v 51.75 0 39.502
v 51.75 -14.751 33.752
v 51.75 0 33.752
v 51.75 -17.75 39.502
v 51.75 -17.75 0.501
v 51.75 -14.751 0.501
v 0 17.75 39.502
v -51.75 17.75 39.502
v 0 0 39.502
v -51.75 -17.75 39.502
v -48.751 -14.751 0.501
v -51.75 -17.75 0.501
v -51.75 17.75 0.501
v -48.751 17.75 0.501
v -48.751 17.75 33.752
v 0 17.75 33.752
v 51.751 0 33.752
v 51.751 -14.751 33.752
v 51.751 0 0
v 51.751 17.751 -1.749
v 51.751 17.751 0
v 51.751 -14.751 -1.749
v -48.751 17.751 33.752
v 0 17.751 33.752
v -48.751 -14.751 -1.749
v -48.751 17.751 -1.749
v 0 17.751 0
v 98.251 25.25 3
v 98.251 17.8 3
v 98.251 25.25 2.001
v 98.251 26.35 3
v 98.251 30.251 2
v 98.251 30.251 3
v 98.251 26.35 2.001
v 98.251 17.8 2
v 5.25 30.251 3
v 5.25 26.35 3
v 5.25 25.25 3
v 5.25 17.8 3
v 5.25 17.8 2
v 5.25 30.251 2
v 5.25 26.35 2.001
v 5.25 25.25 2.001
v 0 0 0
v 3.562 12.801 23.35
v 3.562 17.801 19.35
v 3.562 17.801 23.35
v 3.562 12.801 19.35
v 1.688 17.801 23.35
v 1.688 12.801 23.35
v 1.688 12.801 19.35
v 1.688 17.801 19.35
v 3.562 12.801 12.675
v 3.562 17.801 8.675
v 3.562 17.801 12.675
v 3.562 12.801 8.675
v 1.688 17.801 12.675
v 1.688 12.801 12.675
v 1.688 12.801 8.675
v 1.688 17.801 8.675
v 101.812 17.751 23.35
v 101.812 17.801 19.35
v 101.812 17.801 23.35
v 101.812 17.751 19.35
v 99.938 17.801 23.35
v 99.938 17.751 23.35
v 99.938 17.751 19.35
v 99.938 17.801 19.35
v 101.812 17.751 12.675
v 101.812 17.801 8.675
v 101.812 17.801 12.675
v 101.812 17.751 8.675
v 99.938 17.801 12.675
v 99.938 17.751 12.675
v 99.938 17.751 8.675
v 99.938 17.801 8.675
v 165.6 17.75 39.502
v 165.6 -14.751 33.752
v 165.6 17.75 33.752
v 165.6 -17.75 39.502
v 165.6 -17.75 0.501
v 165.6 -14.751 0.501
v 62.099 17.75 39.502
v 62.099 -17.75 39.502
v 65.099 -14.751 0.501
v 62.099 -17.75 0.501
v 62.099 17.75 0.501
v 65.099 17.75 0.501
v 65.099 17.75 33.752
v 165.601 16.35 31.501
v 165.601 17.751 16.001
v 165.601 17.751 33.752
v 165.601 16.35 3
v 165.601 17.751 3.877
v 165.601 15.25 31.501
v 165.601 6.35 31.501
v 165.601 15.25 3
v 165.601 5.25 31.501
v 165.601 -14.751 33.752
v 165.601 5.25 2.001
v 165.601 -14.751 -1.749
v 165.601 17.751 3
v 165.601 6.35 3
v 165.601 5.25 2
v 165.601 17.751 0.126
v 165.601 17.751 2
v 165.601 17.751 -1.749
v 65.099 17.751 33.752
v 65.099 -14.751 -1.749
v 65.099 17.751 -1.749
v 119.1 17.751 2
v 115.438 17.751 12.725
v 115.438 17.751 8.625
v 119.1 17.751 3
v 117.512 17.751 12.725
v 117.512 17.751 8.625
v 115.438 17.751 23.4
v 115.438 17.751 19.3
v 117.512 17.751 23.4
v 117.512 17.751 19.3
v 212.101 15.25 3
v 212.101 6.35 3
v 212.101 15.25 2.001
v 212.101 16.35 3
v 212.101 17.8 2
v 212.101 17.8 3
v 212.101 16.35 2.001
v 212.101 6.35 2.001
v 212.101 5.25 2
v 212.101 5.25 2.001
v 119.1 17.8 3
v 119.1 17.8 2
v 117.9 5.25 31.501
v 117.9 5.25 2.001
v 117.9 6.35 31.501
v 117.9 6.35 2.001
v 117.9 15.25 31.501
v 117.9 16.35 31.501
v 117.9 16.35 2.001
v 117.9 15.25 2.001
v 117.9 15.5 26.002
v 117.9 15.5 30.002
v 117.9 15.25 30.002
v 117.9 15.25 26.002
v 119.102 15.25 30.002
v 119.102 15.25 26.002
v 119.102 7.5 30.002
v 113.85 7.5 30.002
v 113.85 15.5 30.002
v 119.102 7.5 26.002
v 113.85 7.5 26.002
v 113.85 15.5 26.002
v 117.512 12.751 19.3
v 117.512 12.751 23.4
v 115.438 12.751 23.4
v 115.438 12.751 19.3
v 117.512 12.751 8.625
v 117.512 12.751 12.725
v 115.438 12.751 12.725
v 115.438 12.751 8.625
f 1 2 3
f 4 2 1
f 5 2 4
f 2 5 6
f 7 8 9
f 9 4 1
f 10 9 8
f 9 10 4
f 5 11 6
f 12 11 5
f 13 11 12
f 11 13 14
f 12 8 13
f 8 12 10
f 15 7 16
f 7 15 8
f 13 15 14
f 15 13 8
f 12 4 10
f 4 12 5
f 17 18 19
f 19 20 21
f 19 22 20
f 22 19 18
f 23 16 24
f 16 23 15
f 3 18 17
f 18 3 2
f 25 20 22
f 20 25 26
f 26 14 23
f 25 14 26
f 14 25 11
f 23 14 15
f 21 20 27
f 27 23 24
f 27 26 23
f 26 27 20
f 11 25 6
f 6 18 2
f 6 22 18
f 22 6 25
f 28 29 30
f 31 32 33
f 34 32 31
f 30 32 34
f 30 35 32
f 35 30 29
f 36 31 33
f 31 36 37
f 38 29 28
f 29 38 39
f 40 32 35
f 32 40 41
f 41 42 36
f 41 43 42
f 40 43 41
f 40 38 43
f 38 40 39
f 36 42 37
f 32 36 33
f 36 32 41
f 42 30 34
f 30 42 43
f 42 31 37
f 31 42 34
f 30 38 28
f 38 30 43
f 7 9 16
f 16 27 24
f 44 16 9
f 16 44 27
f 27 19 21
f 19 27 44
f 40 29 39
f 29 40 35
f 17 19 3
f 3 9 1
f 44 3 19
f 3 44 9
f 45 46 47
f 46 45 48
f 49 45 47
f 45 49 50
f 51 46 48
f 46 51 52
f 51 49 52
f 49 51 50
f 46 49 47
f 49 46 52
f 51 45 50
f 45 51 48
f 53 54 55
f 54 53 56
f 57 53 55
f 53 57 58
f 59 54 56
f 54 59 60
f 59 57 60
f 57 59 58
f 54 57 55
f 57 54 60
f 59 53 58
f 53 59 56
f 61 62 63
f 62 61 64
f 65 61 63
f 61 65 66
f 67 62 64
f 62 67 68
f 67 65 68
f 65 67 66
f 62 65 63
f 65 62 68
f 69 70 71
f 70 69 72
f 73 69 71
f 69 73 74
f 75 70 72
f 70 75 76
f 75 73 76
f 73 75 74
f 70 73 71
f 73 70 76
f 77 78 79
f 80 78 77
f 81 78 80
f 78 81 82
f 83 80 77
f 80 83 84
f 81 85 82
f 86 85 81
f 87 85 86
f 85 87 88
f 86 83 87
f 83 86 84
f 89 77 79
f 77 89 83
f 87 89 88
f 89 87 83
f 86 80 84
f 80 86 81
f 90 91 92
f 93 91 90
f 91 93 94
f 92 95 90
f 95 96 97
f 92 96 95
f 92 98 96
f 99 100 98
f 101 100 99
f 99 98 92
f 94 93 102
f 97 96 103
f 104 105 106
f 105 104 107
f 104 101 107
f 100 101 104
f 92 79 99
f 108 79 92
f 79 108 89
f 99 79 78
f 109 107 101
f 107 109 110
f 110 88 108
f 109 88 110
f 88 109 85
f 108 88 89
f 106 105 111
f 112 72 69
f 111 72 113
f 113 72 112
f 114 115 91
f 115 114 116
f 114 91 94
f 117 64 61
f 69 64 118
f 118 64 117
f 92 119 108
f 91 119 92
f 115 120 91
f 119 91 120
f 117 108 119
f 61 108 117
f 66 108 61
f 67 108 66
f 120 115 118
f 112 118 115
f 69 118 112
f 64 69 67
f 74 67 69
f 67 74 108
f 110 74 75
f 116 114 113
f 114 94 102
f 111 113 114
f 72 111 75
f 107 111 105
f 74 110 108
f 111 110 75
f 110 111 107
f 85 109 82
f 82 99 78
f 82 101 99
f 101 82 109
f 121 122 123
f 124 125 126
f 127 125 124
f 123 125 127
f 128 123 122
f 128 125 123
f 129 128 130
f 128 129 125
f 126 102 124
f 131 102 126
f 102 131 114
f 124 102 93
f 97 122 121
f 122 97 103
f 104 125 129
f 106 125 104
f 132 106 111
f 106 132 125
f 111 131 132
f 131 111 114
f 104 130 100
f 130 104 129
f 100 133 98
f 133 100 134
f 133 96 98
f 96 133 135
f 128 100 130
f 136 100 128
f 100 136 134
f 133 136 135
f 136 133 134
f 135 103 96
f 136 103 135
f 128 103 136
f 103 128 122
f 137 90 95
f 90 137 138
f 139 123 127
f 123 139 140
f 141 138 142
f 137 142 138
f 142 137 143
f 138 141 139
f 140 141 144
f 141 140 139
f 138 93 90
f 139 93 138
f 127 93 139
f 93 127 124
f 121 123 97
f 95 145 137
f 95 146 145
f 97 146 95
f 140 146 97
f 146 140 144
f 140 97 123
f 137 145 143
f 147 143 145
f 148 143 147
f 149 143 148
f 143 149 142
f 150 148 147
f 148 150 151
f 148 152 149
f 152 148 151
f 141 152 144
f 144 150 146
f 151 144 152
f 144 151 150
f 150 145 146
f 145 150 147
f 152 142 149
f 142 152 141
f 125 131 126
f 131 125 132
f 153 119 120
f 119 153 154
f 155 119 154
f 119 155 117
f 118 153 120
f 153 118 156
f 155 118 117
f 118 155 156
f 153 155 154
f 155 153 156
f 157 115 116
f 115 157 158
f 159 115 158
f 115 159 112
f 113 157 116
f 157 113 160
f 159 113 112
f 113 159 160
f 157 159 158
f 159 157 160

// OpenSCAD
use <BOSL2/std.scad>

use <primitives/prisms.scad>
use <primitives/boxes.scad>
use <snap_joints/cantilever.scad>

eps=0.001;

box_bottom_two_halves(depth=25, div_locs=[0, 10, 20]);

module box_bottom_two_halves (
depth,
div_locs, 
width=93,
outer_height=35, 
inner_height=28, 
inner_wall_thickness=3.75, 
outer_wall_thickness=1.5, 
snap_plug_block_height=3, 
snap_plug_width=7, 
snap_socket_tol=1.0,
chamfer=2.0,
div_thickness=1.0,
div_extra_width=1.0,
div_tol=0.7,
div_z_indent=0.5,
extra_bottom_thickness=1.0, 
center=false,
) 
{ 
    
    full_width = width + outer_wall_thickness*2 + inner_wall_thickness*2;
    full_depth = depth + outer_wall_thickness*2 + inner_wall_thickness*2+ 0.1;
    full_height = outer_height +outer_wall_thickness + extra_bottom_thickness;
    
 
    join_plug_depth = 5;
    join_plug_width = inner_wall_thickness * 0.5;
    join_plug_height = 4;
    join_socket_tol = 0.1;
    join_socket_depth = join_plug_depth + join_socket_tol;
    join_socket_width = join_plug_width + join_socket_tol*2;
    join_socket_height = join_plug_height + join_socket_tol;
    
    
    left_plug_trans_x = outer_wall_thickness/2 + inner_wall_thickness/2;
    right_plug_trans_x = full_width - outer_wall_thickness/2 - inner_wall_thickness/2;
    plug_trans_y = full_depth/2 - join_plug_depth/2 + eps;

    full_inner_height = inner_height + outer_wall_thickness + extra_bottom_thickness;
    plug_trans_z_0 = full_inner_height*.70;
    plug_trans_z_1 = full_inner_height*.35;

    
    
    union () {
        //first half
        difference(){
            box_bottom(
                depth=depth,
                width=width,
                outer_height=outer_height, 
                inner_height=inner_height, 
                inner_wall_thickness=inner_wall_thickness, 
                outer_wall_thickness=outer_wall_thickness, 
                snap_plug_block_height=snap_plug_block_height, 
                snap_plug_width=snap_plug_width, 
                snap_socket_tol=snap_socket_tol,
                div_locs=div_locs, 
                div_thickness=div_thickness,
                div_extra_width=div_extra_width,
                div_tol=div_tol,
                div_z_indent=div_z_indent,
                extra_bottom_thickness=extra_bottom_thickness, 
                center=center
            ); 
            //cut in half
            cube([full_width*1.2, full_depth/2, full_height*1.2], center=false);
        }
        
        //join plugs
        translate([left_plug_trans_x, plug_trans_y, plug_trans_z_0]){
            cube([join_plug_width, join_plug_depth, join_plug_height], center=true);
        }
        translate([left_plug_trans_x, plug_trans_y, plug_trans_z_1]){
            cube([join_plug_width, join_plug_depth, join_plug_height], center=true);
        }
        translate([right_plug_trans_x, plug_trans_y, plug_trans_z_0]){
            cube([join_plug_width, join_plug_depth, join_plug_height], center=true);
        }
        translate([right_plug_trans_x, plug_trans_y, plug_trans_z_1]){
            cube([join_plug_width, join_plug_depth, join_plug_height], center=true);
        }
    }
    
    
    
    //second half
    translate([full_width*1.1,0,0]){
        
        difference(){
            box_bottom(
                depth=depth,
                width=width,
                outer_height=outer_height, 
                inner_height=inner_height, 
                inner_wall_thickness=inner_wall_thickness, 
                outer_wall_thickness=outer_wall_thickness, 
                snap_plug_block_height=snap_plug_block_height, 
                snap_plug_width=snap_plug_width, 
                div_locs=div_locs, 
                div_thickness=div_thickness,
                div_extra_width=div_extra_width,
                div_tol=div_tol,
                div_z_indent=div_z_indent,
                snap_socket_tol=snap_socket_tol,
                extra_bottom_thickness=extra_bottom_thickness, 
                center=center
            );
            //cut in half
            translate([0,full_depth/2,0]){
                cube([full_width*1.2, full_depth/2, full_height*1.2], center=false);
            }
            
            //join sockets
            translate([left_plug_trans_x, plug_trans_y, plug_trans_z_0]){
                cube([join_socket_width, join_socket_depth, join_socket_height], center=true);
            }
            translate([left_plug_trans_x, plug_trans_y, plug_trans_z_1]){
                cube([join_socket_width, join_socket_depth, join_socket_height], center=true);
            }
            translate([right_plug_trans_x, plug_trans_y, plug_trans_z_0]){
                cube([join_socket_width, join_socket_depth, join_socket_height], center=true);
            }
            translate([right_plug_trans_x, plug_trans_y, plug_trans_z_1]){
                cube([join_socket_width, join_socket_depth, join_socket_height], center=true);
            }
        }
    }

}

module box_bottom (
depth,
width,
outer_height, 
inner_height, 
inner_wall_thickness, 
outer_wall_thickness, 
snap_plug_block_height, 
snap_plug_width, 
snap_socket_tol,
div_thickness,
div_extra_width,
div_tol,
div_z_indent,
chamfer,
div_locs=[], 
extra_bottom_thickness=0, 
center=false
) 
{ 
 
    full_outer_height = outer_height + extra_bottom_thickness;
    
    cut_depth = inner_wall_thickness + outer_wall_thickness+2*eps;
    cut_height =  snap_plug_block_height + snap_socket_tol;
    cut_width = snap_plug_width + snap_socket_tol;
    
    cut_trans_x_left = 0 + cut_depth/2;
    cut_trans_x_right = width + inner_wall_thickness + outer_wall_thickness + cut_depth/2;
    cut_trans_y = depth/4  + inner_wall_thickness + outer_wall_thickness;
    cut_trans_y_2 = depth*3/4  + inner_wall_thickness + outer_wall_thickness;

    cut_trans_z = inner_height + outer_wall_thickness + extra_bottom_thickness/2  - cut_height/2 +eps ;
    
    
    center_trans_x = center ? -1*(width/2 + outer_wall_thickness + inner_wall_thickness) : 0;
    center_trans_y = center ? -1*(depth/2 + outer_wall_thickness + inner_wall_thickness) : 0;
    center_trans_z = center ? -1*(full_outer_height/2 + outer_wall_thickness/2 + extra_bottom_thickness/2) + eps : eps;

    bottom_full_width = width + 2*(outer_wall_thickness + inner_wall_thickness);
    div_width = width + div_extra_width + div_tol*2;
    div_trans_x = bottom_full_width/2 - div_width/2;
    div_trans_y = outer_wall_thickness + inner_wall_thickness;
    div_trans_z = outer_wall_thickness + extra_bottom_thickness - div_z_indent;
    div_height = inner_height+ div_z_indent + extra_bottom_thickness;


    extra_bottom_trans_x = (outer_wall_thickness + inner_wall_thickness);
    extra_bottom_trans_y = (outer_wall_thickness + inner_wall_thickness);
    extra_bottom_trans_z = outer_wall_thickness- eps;

    
    translate([center_trans_x, center_trans_y, center_trans_z]){
        difference() {
            translate([0,0,extra_bottom_thickness/2]){
                union () {
                    open_box_with_lip(width=width, depth=depth, outer_height=full_outer_height, inner_height=inner_height, outer_wall_thickness=outer_wall_thickness, inner_wall_thickness=inner_wall_thickness, chamfer=2.0, center=false);
                    translate([extra_bottom_trans_x, extra_bottom_trans_y, extra_bottom_trans_z]) {
                        cube([width + eps, depth + eps, extra_bottom_thickness], center=false);
                    }
                }
            }
            
            //cut openings for snap fit first
            translate([cut_trans_x_left, cut_trans_y, cut_trans_z]) {
                rotate([0, 0, 90]){
                    cube([cut_width, cut_depth,cut_height], center=true);
                }
            }
            translate([(cut_trans_x_right), cut_trans_y, cut_trans_z]) {
                rotate([0, 0, 90]){
                    cube([cut_width, cut_depth, cut_height ], center=true);
                }
            }
            //cut openings for snap fit second
            translate([cut_trans_x_left, cut_trans_y_2, cut_trans_z]) {
                rotate([0, 0, 90]){
                    cube([cut_width, cut_depth,cut_height], center=true);
                }
            }
            translate([(cut_trans_x_right), cut_trans_y_2, cut_trans_z]) {
                rotate([0, 0, 90]){
                    cube([cut_width, cut_depth, cut_height ], center=true);
                }
            }
            
            
            // cut divider cutouts
            for (div_loc = div_locs) {
                translate([div_trans_x, div_trans_y + div_loc, div_trans_z]){
                    cube([div_width, div_thickness*1.1, div_height]);
                }
            }
        }     
    }
}


//module box_lid (height, center=false) {
//
//    outer_height = lid_outer_height;
//    inner_height = lid_inner_height;
//    
//    stem_depth = inner_wall_thickness;
//    stem_height = ((lid_outer_height - lid_inner_height) + (outer_height-inner_height)) + snap_block_height + snap_socket_tol/2;
//    
//        
//    snap_trans_x_left = 0 + outer_wall_thickness + stem_depth/2 -eps;
//    snap_trans_x_right = width + inner_wall_thickness + outer_wall_thickness + stem_depth/2 +eps;
//    snap_trans_y = depth/2  + inner_wall_thickness + outer_wall_thickness;
//    snap_trans_z = inner_height + outer_wall_thickness  +  stem_height/2 - eps; 
//    
//    
//    center_trans_x = center ? -1*(width/2 + outer_wall_thickness + inner_wall_thickness) : 0;
//    center_trans_y = center ? -1*(depth/2 + outer_wall_thickness + inner_wall_thickness) : 0;
//    center_trans_z = center ? -1*(height/2 + outer_wall_thickness/2) : 0;
//
//    translate([center_trans_x, center_trans_y, center_trans_z]){
//        union(){
//            open_box_with_lip(width=width, depth=depth, outer_height=outer_height, inner_height=inner_height, outer_wall_thickness=outer_wall_thickness, inner_wall_thickness=inner_wall_thickness, chamfer=2.0);
//
//            translate([snap_trans_x_left, snap_trans_y, snap_trans_z]){
//                rotate([0, 0, 90])
//                snap_fit_plug(width=snap_plug_width, stem_height=stem_height, stem_depth=stem_depth, block_height=snap_block_height, block_depth=snap_block_depth);
//            }
//            translate([snap_trans_x_right, snap_trans_y ,snap_trans_z]){
//                rotate([0, 0, -90])
//                snap_fit_plug(width=snap_plug_width, stem_height=stem_height, stem_depth=stem_depth, block_height=snap_block_height, block_depth=snap_block_depth);
//            }
//        
//        } 
//    }
//} 


module divider2(
text, 
width=94, 
height=68, 
thickness=1, 
text_height=5, 
top_bar_width_percentage=0.55
) 
{
    text_thickness = thickness*0.75;
    text_buffer = max(1.5, text_height/10);
    text_spacing = max(1.15, 1 + text_buffer/10);
    
    top_bar_height = text_height + text_buffer*2;
    top_bar_width = width*top_bar_width_percentage; // TODO: change
    bottom_bar_height = top_bar_height;
    bottom_bar_width = width;
    
       
    middle_bar_height = height - top_bar_height - bottom_bar_height + 0.001;
    middle_bar_width = bottom_bar_height;
    
    top_bar_trans_y = height/2 - top_bar_height/2;
    text_trans_y = top_bar_trans_y;// - text_buffer;
    text_trans_z = (text_thickness - thickness/2)*-1;///2 * -1;
    bottom_bar_trans_y = -1 * (height/2 - bottom_bar_height/2);
    second_bottom_bar_trans_y = bottom_bar_trans_y + bottom_bar_height*2;

    union() {
        difference() {
            translate([0, top_bar_trans_y, 0]) {
                cube([top_bar_width,top_bar_height, thickness], center=true);
            }
            translate([0, text_trans_y, text_trans_z]){
                linear_extrude(text_thickness)
                //text(text, size=text_height, font= "Comic Sans MS:style=Bold", halign="center", valign="center", spacing=text_spacing);
                text(text, size=text_height, font="Helvetica:style=Bold", halign="center", valign="center", spacing=text_spacing);

            }
        }
        cube([middle_bar_width, middle_bar_height, thickness], center=true);

        translate([0,bottom_bar_trans_y,0]){
            cube([bottom_bar_width, bottom_bar_height, thickness], center=true);
        }
        translate([0,second_bottom_bar_trans_y,0]){
            cube([bottom_bar_width, bottom_bar_height, thickness], center=true);
        }
    }  
}
